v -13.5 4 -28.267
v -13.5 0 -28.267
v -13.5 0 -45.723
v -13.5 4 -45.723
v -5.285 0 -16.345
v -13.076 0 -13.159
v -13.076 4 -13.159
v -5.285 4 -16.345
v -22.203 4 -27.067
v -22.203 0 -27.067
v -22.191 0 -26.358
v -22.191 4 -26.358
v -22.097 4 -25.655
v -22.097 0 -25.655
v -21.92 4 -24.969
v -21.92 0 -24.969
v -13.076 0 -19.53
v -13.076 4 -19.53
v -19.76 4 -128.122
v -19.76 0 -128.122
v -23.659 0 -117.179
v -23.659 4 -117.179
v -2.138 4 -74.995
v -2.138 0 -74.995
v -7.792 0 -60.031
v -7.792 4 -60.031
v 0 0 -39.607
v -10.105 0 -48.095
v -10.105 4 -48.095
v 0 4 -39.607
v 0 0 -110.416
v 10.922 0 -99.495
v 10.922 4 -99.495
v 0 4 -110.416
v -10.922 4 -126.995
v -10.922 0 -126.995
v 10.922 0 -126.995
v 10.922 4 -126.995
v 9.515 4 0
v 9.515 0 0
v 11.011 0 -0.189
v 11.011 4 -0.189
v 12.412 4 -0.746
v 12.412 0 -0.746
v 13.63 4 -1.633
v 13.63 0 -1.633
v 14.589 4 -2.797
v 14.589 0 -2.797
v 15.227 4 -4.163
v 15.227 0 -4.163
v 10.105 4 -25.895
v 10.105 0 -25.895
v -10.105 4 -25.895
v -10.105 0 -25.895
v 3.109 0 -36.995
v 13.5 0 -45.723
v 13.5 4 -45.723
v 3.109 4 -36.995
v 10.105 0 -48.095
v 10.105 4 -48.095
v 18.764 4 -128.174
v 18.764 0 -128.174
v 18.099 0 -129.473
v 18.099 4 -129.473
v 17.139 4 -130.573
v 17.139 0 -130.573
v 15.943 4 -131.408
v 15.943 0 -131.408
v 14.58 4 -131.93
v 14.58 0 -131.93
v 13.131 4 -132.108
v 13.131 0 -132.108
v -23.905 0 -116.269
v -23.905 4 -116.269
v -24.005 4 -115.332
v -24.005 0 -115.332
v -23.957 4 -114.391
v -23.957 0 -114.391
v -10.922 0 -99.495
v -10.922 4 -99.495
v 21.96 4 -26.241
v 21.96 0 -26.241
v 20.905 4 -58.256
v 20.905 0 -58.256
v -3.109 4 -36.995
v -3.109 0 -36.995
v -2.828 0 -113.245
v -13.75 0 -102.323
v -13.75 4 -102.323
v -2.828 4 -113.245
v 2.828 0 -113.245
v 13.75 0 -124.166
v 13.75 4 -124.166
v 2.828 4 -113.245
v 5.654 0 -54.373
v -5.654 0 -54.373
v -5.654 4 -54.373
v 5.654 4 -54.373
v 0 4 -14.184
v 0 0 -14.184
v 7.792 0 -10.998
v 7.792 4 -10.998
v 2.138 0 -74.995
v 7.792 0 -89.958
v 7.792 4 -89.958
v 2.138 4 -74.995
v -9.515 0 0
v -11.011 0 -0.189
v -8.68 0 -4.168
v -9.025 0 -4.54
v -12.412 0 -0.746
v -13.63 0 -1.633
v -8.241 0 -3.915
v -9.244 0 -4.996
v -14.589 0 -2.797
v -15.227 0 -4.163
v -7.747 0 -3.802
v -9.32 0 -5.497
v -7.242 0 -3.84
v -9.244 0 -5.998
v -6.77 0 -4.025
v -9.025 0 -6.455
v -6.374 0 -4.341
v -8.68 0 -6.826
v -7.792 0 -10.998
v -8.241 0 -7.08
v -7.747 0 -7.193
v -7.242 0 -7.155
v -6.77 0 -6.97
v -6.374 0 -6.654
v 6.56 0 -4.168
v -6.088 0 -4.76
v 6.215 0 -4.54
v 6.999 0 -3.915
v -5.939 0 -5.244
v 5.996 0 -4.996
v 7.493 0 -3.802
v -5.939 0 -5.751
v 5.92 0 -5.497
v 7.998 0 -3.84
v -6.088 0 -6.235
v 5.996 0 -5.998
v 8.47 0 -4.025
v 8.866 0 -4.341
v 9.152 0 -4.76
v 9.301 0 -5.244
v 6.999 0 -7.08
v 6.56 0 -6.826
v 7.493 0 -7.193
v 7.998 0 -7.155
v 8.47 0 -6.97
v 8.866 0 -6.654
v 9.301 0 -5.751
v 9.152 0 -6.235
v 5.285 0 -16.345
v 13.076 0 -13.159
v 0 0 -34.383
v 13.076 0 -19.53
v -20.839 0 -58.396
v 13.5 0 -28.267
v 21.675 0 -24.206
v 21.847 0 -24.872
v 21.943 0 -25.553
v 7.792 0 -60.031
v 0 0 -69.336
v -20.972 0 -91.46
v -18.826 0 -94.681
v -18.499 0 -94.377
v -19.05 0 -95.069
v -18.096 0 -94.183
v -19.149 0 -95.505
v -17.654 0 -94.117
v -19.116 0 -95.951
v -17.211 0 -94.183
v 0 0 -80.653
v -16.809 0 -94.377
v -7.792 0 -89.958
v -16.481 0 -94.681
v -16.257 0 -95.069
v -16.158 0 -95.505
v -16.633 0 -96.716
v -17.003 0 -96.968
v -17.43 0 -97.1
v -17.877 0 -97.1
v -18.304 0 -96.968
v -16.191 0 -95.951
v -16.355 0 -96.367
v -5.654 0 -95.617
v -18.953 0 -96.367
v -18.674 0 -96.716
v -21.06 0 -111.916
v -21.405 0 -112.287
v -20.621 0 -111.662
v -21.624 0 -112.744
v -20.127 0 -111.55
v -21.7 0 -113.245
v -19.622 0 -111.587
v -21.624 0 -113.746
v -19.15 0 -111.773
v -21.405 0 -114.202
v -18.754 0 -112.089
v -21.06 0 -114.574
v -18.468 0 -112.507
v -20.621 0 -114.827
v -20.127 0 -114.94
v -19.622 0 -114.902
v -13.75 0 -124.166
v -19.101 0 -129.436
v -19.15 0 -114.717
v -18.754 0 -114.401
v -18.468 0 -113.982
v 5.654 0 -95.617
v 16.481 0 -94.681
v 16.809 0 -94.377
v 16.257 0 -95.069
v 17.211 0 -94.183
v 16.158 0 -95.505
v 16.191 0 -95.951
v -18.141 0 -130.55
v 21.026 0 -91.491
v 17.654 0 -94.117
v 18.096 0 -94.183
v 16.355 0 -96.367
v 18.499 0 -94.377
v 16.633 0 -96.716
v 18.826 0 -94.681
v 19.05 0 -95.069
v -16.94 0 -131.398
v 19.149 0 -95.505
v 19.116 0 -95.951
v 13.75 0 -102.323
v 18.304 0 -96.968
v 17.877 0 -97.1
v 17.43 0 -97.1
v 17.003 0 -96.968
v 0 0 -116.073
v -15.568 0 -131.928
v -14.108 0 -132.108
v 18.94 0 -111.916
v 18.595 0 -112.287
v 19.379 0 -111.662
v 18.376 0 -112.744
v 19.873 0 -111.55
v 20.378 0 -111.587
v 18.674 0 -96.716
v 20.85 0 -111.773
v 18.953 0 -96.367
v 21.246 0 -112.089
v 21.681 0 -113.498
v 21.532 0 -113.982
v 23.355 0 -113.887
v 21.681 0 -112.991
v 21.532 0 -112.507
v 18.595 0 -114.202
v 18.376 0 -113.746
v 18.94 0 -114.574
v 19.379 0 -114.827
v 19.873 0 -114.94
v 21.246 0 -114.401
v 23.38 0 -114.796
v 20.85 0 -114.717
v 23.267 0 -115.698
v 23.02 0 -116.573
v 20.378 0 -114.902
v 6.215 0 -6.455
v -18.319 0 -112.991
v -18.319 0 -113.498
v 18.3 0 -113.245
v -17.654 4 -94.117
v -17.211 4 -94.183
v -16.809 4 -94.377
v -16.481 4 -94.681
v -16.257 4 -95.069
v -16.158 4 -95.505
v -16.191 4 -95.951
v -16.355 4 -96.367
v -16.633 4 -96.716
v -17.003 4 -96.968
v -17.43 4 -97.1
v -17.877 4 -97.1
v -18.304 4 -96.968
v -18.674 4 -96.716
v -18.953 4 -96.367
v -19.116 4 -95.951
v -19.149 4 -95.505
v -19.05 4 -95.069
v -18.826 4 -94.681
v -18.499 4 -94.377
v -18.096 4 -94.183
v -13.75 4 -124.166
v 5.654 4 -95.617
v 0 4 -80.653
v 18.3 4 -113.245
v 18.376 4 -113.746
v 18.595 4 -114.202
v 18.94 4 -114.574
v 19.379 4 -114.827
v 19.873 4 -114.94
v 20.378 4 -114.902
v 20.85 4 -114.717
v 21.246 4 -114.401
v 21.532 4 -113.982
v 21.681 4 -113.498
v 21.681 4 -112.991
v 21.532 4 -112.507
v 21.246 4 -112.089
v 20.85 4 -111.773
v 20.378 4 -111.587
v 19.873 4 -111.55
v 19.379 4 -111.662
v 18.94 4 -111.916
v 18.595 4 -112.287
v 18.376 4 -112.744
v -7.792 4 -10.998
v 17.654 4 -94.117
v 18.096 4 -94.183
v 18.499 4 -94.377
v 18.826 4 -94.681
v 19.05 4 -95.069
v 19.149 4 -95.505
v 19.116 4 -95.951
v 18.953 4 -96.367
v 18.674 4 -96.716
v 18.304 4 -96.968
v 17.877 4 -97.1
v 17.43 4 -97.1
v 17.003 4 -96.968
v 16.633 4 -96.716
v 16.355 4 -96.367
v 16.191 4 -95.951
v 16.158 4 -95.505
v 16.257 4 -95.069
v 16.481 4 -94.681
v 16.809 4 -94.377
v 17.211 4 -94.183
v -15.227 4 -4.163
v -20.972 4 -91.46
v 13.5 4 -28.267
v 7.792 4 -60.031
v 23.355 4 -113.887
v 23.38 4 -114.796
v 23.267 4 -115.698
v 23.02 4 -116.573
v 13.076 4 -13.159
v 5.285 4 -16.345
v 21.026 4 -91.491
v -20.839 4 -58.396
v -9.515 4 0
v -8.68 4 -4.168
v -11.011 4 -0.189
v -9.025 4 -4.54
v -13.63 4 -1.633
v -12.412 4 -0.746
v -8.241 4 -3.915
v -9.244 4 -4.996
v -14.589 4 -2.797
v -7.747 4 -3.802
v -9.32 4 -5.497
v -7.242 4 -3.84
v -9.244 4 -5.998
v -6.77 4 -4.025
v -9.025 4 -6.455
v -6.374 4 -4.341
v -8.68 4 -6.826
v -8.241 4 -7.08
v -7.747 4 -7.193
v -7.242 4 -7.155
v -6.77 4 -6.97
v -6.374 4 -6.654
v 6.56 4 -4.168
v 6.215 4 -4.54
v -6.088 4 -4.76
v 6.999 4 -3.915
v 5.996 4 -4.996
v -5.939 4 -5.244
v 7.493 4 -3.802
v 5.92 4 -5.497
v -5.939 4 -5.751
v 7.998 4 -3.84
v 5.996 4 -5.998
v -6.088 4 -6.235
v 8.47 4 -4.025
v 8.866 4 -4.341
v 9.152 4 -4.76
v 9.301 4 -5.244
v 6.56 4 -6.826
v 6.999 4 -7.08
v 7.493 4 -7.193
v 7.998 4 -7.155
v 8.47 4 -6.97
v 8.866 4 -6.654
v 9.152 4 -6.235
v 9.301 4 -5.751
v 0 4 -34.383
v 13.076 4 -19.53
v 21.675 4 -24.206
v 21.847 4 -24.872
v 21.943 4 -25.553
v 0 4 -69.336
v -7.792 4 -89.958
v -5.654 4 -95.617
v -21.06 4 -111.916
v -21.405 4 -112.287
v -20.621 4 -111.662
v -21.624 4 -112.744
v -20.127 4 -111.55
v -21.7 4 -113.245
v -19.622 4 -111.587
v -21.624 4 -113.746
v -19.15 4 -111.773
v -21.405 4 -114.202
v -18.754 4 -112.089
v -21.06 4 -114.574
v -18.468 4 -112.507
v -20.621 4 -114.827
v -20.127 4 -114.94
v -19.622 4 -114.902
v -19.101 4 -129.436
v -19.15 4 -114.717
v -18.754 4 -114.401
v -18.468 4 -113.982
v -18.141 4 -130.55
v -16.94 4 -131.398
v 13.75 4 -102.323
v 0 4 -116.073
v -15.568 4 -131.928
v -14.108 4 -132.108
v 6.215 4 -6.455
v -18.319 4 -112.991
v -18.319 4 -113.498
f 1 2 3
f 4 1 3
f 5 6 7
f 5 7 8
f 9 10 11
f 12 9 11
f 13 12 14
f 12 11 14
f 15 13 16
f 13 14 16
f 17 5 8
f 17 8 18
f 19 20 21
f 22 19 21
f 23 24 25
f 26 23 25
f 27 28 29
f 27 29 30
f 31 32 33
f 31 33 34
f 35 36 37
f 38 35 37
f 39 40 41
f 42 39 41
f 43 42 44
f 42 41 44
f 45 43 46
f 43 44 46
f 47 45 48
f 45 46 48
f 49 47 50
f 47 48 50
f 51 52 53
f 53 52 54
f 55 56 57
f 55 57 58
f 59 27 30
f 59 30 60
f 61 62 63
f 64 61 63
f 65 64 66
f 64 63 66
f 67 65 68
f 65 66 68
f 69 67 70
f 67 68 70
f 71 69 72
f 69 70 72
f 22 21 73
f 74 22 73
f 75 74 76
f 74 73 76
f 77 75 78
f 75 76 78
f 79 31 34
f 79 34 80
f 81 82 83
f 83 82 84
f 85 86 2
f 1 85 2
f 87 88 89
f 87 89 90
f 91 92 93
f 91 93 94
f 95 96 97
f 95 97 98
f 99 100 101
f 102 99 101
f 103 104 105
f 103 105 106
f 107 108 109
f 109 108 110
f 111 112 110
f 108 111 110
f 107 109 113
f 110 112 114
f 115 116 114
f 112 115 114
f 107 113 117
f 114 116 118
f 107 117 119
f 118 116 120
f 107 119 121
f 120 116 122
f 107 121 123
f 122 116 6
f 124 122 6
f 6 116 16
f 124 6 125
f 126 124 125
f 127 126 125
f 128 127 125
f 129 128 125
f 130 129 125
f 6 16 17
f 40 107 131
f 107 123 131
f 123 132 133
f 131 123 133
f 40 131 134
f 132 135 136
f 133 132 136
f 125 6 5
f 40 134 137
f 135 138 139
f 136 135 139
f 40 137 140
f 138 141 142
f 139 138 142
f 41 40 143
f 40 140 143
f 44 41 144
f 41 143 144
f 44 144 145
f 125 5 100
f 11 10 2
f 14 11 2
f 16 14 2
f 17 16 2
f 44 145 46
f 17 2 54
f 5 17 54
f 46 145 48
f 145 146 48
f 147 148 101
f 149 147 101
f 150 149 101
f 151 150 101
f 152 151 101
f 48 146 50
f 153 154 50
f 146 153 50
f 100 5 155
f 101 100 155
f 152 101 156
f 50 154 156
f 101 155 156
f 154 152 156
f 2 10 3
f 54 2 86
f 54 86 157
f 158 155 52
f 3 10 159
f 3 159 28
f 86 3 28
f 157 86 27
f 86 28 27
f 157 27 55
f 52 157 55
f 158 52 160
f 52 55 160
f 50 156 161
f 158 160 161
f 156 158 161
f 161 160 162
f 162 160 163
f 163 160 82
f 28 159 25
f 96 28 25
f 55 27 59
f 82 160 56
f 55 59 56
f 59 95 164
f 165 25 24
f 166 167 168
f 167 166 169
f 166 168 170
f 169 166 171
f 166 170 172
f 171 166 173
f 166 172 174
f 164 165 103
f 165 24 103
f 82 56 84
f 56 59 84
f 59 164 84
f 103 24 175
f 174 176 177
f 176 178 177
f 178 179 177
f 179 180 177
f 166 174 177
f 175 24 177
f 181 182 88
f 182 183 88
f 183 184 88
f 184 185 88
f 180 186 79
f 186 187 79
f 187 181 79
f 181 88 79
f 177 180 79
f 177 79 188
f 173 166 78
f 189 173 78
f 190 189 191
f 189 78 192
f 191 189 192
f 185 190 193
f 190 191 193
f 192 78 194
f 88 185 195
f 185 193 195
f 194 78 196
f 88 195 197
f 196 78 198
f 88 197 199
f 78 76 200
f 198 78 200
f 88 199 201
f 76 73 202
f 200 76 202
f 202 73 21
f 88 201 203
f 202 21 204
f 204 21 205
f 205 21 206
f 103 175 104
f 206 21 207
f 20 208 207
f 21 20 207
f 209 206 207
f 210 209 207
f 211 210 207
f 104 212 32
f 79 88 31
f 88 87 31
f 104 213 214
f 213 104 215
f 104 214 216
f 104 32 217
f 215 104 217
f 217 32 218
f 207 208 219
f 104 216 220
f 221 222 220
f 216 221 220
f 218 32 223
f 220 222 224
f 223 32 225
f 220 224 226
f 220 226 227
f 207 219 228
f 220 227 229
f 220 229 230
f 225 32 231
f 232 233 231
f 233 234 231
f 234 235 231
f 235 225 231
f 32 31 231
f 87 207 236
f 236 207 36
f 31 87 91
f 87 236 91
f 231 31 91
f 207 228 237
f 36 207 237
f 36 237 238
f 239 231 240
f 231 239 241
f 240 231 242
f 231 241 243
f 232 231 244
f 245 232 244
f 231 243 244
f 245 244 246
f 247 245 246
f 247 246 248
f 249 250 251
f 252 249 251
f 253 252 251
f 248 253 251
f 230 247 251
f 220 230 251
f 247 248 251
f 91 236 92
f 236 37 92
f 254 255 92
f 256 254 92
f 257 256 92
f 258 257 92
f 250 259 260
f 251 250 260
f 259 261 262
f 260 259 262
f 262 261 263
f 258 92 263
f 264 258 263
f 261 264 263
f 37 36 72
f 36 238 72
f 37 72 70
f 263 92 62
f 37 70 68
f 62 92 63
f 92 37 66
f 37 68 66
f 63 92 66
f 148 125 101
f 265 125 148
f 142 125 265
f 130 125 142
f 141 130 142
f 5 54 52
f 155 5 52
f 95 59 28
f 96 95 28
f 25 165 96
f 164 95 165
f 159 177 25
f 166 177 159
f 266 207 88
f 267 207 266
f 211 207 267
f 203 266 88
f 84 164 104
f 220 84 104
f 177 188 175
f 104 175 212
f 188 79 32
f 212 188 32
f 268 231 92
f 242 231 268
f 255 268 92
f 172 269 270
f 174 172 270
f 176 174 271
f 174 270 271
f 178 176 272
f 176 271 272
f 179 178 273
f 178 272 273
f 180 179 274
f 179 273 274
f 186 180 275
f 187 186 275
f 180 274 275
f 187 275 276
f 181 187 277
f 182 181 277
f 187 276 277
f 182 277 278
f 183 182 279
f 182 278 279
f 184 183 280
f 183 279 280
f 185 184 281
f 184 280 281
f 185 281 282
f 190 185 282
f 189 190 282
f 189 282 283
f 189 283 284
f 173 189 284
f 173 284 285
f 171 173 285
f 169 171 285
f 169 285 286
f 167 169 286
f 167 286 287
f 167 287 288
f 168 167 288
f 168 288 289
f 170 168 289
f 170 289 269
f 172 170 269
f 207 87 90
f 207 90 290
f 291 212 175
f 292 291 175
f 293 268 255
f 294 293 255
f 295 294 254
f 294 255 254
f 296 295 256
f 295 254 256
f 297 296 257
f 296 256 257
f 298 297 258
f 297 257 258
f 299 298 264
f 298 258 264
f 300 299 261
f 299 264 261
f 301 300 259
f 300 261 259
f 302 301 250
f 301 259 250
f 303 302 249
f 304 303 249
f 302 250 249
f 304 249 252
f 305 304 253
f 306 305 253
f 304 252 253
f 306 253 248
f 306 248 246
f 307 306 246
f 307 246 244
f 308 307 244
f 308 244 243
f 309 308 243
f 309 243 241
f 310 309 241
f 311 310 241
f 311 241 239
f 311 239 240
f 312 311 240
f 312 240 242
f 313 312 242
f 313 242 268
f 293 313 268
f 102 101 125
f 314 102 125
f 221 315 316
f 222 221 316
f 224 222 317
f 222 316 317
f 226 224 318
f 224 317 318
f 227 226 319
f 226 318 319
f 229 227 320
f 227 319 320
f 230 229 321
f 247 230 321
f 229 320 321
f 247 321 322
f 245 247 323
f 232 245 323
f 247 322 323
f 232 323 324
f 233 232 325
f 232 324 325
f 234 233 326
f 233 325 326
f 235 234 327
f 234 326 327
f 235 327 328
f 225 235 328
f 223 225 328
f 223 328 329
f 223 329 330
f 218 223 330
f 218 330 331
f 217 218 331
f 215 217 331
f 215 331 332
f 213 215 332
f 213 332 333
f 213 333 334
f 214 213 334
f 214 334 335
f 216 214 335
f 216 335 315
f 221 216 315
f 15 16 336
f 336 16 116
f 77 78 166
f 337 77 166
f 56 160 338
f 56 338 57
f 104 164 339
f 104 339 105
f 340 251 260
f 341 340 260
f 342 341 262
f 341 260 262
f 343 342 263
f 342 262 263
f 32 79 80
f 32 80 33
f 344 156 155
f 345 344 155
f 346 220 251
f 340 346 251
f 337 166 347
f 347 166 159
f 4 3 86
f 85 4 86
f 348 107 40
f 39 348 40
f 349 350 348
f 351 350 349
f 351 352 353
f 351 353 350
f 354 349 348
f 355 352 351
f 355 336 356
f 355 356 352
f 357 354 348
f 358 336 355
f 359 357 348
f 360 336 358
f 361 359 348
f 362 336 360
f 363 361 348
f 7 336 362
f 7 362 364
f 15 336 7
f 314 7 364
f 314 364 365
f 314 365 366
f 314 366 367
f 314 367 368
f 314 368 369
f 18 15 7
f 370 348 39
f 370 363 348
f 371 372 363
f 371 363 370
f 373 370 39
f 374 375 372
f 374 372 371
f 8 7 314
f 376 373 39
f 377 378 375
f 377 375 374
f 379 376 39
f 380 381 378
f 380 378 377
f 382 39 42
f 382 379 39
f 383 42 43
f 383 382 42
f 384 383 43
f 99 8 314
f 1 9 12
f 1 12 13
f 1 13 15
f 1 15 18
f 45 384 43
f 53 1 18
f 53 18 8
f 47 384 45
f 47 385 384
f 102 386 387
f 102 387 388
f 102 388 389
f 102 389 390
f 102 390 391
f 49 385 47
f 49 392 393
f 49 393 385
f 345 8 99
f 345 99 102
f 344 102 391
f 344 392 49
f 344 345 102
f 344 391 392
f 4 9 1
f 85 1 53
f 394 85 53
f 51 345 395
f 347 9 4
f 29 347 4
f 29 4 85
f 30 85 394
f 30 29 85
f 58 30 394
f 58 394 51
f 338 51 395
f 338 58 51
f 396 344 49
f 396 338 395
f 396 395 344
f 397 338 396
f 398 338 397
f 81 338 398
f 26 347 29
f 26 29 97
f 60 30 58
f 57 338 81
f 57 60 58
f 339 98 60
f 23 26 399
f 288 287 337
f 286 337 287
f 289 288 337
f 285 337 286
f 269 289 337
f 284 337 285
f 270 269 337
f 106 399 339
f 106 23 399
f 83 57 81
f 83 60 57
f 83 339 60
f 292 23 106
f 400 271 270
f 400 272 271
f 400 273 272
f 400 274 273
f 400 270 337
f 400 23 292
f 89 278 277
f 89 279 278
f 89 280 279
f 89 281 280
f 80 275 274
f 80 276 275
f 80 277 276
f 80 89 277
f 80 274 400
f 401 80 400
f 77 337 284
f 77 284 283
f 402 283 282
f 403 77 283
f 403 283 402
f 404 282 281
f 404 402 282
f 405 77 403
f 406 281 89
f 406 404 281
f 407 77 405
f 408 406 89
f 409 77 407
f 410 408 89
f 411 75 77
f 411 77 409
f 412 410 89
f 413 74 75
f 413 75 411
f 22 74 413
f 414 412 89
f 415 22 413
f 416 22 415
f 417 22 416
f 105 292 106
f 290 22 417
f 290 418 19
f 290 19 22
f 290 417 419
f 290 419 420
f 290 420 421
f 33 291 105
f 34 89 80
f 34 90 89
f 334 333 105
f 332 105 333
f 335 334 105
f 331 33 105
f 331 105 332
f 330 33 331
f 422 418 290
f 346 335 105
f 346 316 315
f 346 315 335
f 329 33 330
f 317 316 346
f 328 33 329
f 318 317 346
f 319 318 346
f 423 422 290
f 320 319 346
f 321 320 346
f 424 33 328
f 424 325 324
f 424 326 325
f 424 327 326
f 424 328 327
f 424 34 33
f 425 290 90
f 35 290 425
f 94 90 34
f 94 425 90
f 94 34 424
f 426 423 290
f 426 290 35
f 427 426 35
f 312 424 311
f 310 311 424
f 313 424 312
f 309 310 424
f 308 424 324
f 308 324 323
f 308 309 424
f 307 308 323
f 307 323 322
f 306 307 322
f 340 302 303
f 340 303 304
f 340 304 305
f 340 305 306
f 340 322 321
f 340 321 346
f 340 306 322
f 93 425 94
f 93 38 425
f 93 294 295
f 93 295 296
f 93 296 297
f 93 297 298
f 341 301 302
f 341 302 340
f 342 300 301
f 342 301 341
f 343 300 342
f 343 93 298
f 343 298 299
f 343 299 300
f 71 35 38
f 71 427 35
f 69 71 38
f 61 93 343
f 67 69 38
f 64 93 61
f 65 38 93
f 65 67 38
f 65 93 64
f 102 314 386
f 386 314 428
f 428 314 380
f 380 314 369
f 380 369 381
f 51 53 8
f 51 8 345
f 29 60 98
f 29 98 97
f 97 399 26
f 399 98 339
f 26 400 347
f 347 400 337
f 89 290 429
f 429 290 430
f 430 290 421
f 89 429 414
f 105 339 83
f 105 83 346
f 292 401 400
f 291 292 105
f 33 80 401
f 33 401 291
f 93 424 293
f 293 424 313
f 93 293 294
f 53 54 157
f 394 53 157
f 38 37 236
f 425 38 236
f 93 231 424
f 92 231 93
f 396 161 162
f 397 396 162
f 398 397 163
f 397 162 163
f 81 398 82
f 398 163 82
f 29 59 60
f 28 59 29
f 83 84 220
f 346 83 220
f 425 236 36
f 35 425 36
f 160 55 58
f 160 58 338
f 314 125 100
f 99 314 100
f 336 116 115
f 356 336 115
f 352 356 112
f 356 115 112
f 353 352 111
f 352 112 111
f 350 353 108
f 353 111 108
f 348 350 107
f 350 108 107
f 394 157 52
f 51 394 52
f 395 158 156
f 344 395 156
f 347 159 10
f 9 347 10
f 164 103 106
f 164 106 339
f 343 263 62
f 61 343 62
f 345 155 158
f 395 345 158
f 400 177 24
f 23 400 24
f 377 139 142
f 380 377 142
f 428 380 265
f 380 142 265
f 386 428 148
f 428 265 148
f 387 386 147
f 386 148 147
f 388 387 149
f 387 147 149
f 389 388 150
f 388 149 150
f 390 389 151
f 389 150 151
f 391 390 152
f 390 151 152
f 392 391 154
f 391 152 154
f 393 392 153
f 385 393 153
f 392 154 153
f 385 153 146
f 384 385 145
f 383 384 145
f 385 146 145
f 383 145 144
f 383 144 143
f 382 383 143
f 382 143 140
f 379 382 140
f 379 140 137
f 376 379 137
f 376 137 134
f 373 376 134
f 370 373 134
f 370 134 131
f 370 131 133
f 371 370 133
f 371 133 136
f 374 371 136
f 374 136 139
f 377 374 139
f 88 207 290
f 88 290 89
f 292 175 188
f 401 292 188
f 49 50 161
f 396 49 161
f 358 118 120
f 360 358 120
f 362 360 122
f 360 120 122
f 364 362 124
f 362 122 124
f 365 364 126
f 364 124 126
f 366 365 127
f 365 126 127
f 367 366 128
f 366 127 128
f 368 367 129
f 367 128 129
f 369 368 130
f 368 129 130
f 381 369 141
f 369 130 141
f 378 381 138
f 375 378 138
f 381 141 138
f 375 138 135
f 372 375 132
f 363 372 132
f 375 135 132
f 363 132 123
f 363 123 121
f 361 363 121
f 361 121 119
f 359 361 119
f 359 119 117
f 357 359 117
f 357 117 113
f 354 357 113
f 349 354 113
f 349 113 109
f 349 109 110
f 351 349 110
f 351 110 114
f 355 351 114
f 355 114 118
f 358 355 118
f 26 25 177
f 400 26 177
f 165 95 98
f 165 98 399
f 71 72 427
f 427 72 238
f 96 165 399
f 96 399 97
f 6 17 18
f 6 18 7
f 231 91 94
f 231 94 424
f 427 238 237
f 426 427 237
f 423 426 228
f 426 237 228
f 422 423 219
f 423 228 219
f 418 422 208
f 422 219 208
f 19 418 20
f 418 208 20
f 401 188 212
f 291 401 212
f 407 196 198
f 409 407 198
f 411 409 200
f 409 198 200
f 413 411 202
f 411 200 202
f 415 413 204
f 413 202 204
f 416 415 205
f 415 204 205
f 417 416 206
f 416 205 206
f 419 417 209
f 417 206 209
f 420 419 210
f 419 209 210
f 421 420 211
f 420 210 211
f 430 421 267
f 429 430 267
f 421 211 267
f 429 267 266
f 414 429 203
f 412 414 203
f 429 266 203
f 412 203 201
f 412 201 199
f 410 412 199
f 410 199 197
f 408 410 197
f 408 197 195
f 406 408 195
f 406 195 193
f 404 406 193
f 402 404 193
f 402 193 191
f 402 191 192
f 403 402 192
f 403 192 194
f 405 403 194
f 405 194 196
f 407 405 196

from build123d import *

# Parameters (mm, degrees)
BOSS_EXTRUDE1_DEPTH  = 4
M3_CLEARANCE_HOLE1_D = 3.4
SKETCH4_R            = 1.5
CUT_EXTRUDE1_DEPTH   = 135.330995523


with BuildPart() as part:
    # Sketch1 → Boss-Extrude1 (new body)
    with BuildSketch(Plane(origin=(0, 0, 0), x_dir=(1, 0, 0), z_dir=(0, 1, 0))):
        with BuildLine():
            Line((-9.515488572, 0), (9.515488572, 0))
            ThreePointArc((9.515488572, 0), (13.049333225, 1.15108858), (15.227255138, 4.162686012))
            Line((15.227255138, 4.162686012), (21.674585029, 24.205881435))
            ThreePointArc((21.674585029, 24.205881435), (21.904821248, 25.210967753), (21.959569126, 26.240632696))
            Line((21.959569126, 26.240632696), (20.905492982, 58.256025321))
            Line((20.905492982, 58.256025321), (21.026416806, 91.49070067))
            Line((21.026416806, 91.49070067), (23.354507229, 113.886787435))
            ThreePointArc((23.354507229, 113.886787435), (23.340591043, 115.249277617), (23.019622055, 116.573495146))
            Line((23.019622055, 116.573495146), (18.764127525, 128.174177455))
            ThreePointArc((18.764127525, 128.174177455), (16.566422509, 131.027083341), (13.131169609, 132.107831618))
            Line((13.131169609, 132.107831618), (-14.108422678, 132.107831618))
            ThreePointArc((-14.108422678, 132.107831618), (-17.566572488, 131.011014247), (-19.760402704, 128.121564914))
            Line((-19.760402704, 128.121564914), (-23.659003651, 117.179294294))
            ThreePointArc((-23.659003651, 117.179294294), (-23.973087581, 115.802805743), (-23.956822357, 114.391032075))
            Line((-23.956822357, 114.391032075), (-20.971772171, 91.460387024))
            Line((-20.971772171, 91.460387024), (-20.839350394, 58.395973604))
            Line((-20.839350394, 58.395973604), (-22.202521241, 27.066826186))
            ThreePointArc((-22.202521241, 27.066826186), (-22.154511659, 26.005197672), (-21.919959446, 24.968691386))
            Line((-21.919959446, 24.968691386), (-15.227255138, 4.162686012))
            ThreePointArc((-15.227255138, 4.162686012), (-13.049333225, 1.15108858), (-9.515488572, 0))
        make_face()
        Polygon((-13.5, 28.266780853), (-13.5, 45.722835983), (-3.109490994, 36.994808418), align=None, mode=Mode.SUBTRACT)
        Polygon((-10.104794721, 48.094808418), (0, 39.606780853), (10.104794721, 48.094808418), align=None, mode=Mode.SUBTRACT)
        Polygon((13.5, 28.266780853), (13.5, 45.722835983), (3.109490994, 36.994808418), align=None, mode=Mode.SUBTRACT)
        Polygon((0, 34.382835983), (10.104794721, 25.894808418), (-10.104794721, 25.894808418), align=None, mode=Mode.SUBTRACT)
        Polygon((-13.076324897, 19.530410576), (-13.076324897, 13.159093094), (-5.284733567, 16.344751835), align=None, mode=Mode.SUBTRACT)
        Polygon((5.284733567, 16.344751835), (13.076324897, 19.530410576), (13.076324897, 13.159093094), align=None, mode=Mode.SUBTRACT)
        Polygon((-7.79159133, 10.998384586), (0, 14.184043327), (7.79159133, 10.998384586), align=None, mode=Mode.SUBTRACT)
        Polygon((13.75, 102.323235543), (13.75, 124.166381293), (2.828427125, 113.244808418), align=None, mode=Mode.SUBTRACT)
        Polygon((-10.921572875, 99.494808418), (10.921572875, 99.494808418), (0, 110.416381293), align=None, mode=Mode.SUBTRACT)
        Polygon((-13.75, 102.323235543), (-2.828427125, 113.244808418), (-13.75, 124.166381293), align=None, mode=Mode.SUBTRACT)
        Polygon((0, 116.073235543), (-10.921572875, 126.994808418), (10.921572875, 126.994808418), align=None, mode=Mode.SUBTRACT)
        Polygon((-7.79159133, 89.958123907), (-2.137995178, 74.994808418), (-7.79159133, 60.031492928), align=None, mode=Mode.SUBTRACT)
        Polygon((-5.653596152, 54.372882815), (5.653596152, 54.372882815), (0, 69.336198304), align=None, mode=Mode.SUBTRACT)
        Polygon((-5.653596152, 95.616734021), (5.653596152, 95.616734021), (0, 80.653418531), align=None, mode=Mode.SUBTRACT)
        Polygon((7.79159133, 60.031492928), (7.79159133, 89.958123907), (2.137995178, 74.994808418), align=None, mode=Mode.SUBTRACT)
    extrude(amount=BOSS_EXTRUDE1_DEPTH)

    # M3 Clearance Hole1 (through all)
    with Locations(Plane(origin=(0, 4, 0), x_dir=(1, 0, 0), z_dir=(0, 1, 0))):
        with Locations((-7.62, 5.497333735), (7.62, 5.497333735), (20, 113.244808418), (-20, 113.244808418)):
            Hole(M3_CLEARANCE_HOLE1_D / 2)

    # Sketch4 → Cut-Extrude1 (cut, through all)
    with BuildSketch(Plane(origin=(0, 4, 0), x_dir=(1, 0, 0), z_dir=(0, 1, 0))):
        with Locations(Location((-17.653596152, 95.616734021, 0), (0, 0, 270))):
            Circle(SKETCH4_R)
        with Locations(Location((17.653596152, 95.616734021, 0), (0, 0, 270))):
            Circle(SKETCH4_R)
    extrude(amount=-CUT_EXTRUDE1_DEPTH, mode=Mode.SUBTRACT)


solid = part.part
